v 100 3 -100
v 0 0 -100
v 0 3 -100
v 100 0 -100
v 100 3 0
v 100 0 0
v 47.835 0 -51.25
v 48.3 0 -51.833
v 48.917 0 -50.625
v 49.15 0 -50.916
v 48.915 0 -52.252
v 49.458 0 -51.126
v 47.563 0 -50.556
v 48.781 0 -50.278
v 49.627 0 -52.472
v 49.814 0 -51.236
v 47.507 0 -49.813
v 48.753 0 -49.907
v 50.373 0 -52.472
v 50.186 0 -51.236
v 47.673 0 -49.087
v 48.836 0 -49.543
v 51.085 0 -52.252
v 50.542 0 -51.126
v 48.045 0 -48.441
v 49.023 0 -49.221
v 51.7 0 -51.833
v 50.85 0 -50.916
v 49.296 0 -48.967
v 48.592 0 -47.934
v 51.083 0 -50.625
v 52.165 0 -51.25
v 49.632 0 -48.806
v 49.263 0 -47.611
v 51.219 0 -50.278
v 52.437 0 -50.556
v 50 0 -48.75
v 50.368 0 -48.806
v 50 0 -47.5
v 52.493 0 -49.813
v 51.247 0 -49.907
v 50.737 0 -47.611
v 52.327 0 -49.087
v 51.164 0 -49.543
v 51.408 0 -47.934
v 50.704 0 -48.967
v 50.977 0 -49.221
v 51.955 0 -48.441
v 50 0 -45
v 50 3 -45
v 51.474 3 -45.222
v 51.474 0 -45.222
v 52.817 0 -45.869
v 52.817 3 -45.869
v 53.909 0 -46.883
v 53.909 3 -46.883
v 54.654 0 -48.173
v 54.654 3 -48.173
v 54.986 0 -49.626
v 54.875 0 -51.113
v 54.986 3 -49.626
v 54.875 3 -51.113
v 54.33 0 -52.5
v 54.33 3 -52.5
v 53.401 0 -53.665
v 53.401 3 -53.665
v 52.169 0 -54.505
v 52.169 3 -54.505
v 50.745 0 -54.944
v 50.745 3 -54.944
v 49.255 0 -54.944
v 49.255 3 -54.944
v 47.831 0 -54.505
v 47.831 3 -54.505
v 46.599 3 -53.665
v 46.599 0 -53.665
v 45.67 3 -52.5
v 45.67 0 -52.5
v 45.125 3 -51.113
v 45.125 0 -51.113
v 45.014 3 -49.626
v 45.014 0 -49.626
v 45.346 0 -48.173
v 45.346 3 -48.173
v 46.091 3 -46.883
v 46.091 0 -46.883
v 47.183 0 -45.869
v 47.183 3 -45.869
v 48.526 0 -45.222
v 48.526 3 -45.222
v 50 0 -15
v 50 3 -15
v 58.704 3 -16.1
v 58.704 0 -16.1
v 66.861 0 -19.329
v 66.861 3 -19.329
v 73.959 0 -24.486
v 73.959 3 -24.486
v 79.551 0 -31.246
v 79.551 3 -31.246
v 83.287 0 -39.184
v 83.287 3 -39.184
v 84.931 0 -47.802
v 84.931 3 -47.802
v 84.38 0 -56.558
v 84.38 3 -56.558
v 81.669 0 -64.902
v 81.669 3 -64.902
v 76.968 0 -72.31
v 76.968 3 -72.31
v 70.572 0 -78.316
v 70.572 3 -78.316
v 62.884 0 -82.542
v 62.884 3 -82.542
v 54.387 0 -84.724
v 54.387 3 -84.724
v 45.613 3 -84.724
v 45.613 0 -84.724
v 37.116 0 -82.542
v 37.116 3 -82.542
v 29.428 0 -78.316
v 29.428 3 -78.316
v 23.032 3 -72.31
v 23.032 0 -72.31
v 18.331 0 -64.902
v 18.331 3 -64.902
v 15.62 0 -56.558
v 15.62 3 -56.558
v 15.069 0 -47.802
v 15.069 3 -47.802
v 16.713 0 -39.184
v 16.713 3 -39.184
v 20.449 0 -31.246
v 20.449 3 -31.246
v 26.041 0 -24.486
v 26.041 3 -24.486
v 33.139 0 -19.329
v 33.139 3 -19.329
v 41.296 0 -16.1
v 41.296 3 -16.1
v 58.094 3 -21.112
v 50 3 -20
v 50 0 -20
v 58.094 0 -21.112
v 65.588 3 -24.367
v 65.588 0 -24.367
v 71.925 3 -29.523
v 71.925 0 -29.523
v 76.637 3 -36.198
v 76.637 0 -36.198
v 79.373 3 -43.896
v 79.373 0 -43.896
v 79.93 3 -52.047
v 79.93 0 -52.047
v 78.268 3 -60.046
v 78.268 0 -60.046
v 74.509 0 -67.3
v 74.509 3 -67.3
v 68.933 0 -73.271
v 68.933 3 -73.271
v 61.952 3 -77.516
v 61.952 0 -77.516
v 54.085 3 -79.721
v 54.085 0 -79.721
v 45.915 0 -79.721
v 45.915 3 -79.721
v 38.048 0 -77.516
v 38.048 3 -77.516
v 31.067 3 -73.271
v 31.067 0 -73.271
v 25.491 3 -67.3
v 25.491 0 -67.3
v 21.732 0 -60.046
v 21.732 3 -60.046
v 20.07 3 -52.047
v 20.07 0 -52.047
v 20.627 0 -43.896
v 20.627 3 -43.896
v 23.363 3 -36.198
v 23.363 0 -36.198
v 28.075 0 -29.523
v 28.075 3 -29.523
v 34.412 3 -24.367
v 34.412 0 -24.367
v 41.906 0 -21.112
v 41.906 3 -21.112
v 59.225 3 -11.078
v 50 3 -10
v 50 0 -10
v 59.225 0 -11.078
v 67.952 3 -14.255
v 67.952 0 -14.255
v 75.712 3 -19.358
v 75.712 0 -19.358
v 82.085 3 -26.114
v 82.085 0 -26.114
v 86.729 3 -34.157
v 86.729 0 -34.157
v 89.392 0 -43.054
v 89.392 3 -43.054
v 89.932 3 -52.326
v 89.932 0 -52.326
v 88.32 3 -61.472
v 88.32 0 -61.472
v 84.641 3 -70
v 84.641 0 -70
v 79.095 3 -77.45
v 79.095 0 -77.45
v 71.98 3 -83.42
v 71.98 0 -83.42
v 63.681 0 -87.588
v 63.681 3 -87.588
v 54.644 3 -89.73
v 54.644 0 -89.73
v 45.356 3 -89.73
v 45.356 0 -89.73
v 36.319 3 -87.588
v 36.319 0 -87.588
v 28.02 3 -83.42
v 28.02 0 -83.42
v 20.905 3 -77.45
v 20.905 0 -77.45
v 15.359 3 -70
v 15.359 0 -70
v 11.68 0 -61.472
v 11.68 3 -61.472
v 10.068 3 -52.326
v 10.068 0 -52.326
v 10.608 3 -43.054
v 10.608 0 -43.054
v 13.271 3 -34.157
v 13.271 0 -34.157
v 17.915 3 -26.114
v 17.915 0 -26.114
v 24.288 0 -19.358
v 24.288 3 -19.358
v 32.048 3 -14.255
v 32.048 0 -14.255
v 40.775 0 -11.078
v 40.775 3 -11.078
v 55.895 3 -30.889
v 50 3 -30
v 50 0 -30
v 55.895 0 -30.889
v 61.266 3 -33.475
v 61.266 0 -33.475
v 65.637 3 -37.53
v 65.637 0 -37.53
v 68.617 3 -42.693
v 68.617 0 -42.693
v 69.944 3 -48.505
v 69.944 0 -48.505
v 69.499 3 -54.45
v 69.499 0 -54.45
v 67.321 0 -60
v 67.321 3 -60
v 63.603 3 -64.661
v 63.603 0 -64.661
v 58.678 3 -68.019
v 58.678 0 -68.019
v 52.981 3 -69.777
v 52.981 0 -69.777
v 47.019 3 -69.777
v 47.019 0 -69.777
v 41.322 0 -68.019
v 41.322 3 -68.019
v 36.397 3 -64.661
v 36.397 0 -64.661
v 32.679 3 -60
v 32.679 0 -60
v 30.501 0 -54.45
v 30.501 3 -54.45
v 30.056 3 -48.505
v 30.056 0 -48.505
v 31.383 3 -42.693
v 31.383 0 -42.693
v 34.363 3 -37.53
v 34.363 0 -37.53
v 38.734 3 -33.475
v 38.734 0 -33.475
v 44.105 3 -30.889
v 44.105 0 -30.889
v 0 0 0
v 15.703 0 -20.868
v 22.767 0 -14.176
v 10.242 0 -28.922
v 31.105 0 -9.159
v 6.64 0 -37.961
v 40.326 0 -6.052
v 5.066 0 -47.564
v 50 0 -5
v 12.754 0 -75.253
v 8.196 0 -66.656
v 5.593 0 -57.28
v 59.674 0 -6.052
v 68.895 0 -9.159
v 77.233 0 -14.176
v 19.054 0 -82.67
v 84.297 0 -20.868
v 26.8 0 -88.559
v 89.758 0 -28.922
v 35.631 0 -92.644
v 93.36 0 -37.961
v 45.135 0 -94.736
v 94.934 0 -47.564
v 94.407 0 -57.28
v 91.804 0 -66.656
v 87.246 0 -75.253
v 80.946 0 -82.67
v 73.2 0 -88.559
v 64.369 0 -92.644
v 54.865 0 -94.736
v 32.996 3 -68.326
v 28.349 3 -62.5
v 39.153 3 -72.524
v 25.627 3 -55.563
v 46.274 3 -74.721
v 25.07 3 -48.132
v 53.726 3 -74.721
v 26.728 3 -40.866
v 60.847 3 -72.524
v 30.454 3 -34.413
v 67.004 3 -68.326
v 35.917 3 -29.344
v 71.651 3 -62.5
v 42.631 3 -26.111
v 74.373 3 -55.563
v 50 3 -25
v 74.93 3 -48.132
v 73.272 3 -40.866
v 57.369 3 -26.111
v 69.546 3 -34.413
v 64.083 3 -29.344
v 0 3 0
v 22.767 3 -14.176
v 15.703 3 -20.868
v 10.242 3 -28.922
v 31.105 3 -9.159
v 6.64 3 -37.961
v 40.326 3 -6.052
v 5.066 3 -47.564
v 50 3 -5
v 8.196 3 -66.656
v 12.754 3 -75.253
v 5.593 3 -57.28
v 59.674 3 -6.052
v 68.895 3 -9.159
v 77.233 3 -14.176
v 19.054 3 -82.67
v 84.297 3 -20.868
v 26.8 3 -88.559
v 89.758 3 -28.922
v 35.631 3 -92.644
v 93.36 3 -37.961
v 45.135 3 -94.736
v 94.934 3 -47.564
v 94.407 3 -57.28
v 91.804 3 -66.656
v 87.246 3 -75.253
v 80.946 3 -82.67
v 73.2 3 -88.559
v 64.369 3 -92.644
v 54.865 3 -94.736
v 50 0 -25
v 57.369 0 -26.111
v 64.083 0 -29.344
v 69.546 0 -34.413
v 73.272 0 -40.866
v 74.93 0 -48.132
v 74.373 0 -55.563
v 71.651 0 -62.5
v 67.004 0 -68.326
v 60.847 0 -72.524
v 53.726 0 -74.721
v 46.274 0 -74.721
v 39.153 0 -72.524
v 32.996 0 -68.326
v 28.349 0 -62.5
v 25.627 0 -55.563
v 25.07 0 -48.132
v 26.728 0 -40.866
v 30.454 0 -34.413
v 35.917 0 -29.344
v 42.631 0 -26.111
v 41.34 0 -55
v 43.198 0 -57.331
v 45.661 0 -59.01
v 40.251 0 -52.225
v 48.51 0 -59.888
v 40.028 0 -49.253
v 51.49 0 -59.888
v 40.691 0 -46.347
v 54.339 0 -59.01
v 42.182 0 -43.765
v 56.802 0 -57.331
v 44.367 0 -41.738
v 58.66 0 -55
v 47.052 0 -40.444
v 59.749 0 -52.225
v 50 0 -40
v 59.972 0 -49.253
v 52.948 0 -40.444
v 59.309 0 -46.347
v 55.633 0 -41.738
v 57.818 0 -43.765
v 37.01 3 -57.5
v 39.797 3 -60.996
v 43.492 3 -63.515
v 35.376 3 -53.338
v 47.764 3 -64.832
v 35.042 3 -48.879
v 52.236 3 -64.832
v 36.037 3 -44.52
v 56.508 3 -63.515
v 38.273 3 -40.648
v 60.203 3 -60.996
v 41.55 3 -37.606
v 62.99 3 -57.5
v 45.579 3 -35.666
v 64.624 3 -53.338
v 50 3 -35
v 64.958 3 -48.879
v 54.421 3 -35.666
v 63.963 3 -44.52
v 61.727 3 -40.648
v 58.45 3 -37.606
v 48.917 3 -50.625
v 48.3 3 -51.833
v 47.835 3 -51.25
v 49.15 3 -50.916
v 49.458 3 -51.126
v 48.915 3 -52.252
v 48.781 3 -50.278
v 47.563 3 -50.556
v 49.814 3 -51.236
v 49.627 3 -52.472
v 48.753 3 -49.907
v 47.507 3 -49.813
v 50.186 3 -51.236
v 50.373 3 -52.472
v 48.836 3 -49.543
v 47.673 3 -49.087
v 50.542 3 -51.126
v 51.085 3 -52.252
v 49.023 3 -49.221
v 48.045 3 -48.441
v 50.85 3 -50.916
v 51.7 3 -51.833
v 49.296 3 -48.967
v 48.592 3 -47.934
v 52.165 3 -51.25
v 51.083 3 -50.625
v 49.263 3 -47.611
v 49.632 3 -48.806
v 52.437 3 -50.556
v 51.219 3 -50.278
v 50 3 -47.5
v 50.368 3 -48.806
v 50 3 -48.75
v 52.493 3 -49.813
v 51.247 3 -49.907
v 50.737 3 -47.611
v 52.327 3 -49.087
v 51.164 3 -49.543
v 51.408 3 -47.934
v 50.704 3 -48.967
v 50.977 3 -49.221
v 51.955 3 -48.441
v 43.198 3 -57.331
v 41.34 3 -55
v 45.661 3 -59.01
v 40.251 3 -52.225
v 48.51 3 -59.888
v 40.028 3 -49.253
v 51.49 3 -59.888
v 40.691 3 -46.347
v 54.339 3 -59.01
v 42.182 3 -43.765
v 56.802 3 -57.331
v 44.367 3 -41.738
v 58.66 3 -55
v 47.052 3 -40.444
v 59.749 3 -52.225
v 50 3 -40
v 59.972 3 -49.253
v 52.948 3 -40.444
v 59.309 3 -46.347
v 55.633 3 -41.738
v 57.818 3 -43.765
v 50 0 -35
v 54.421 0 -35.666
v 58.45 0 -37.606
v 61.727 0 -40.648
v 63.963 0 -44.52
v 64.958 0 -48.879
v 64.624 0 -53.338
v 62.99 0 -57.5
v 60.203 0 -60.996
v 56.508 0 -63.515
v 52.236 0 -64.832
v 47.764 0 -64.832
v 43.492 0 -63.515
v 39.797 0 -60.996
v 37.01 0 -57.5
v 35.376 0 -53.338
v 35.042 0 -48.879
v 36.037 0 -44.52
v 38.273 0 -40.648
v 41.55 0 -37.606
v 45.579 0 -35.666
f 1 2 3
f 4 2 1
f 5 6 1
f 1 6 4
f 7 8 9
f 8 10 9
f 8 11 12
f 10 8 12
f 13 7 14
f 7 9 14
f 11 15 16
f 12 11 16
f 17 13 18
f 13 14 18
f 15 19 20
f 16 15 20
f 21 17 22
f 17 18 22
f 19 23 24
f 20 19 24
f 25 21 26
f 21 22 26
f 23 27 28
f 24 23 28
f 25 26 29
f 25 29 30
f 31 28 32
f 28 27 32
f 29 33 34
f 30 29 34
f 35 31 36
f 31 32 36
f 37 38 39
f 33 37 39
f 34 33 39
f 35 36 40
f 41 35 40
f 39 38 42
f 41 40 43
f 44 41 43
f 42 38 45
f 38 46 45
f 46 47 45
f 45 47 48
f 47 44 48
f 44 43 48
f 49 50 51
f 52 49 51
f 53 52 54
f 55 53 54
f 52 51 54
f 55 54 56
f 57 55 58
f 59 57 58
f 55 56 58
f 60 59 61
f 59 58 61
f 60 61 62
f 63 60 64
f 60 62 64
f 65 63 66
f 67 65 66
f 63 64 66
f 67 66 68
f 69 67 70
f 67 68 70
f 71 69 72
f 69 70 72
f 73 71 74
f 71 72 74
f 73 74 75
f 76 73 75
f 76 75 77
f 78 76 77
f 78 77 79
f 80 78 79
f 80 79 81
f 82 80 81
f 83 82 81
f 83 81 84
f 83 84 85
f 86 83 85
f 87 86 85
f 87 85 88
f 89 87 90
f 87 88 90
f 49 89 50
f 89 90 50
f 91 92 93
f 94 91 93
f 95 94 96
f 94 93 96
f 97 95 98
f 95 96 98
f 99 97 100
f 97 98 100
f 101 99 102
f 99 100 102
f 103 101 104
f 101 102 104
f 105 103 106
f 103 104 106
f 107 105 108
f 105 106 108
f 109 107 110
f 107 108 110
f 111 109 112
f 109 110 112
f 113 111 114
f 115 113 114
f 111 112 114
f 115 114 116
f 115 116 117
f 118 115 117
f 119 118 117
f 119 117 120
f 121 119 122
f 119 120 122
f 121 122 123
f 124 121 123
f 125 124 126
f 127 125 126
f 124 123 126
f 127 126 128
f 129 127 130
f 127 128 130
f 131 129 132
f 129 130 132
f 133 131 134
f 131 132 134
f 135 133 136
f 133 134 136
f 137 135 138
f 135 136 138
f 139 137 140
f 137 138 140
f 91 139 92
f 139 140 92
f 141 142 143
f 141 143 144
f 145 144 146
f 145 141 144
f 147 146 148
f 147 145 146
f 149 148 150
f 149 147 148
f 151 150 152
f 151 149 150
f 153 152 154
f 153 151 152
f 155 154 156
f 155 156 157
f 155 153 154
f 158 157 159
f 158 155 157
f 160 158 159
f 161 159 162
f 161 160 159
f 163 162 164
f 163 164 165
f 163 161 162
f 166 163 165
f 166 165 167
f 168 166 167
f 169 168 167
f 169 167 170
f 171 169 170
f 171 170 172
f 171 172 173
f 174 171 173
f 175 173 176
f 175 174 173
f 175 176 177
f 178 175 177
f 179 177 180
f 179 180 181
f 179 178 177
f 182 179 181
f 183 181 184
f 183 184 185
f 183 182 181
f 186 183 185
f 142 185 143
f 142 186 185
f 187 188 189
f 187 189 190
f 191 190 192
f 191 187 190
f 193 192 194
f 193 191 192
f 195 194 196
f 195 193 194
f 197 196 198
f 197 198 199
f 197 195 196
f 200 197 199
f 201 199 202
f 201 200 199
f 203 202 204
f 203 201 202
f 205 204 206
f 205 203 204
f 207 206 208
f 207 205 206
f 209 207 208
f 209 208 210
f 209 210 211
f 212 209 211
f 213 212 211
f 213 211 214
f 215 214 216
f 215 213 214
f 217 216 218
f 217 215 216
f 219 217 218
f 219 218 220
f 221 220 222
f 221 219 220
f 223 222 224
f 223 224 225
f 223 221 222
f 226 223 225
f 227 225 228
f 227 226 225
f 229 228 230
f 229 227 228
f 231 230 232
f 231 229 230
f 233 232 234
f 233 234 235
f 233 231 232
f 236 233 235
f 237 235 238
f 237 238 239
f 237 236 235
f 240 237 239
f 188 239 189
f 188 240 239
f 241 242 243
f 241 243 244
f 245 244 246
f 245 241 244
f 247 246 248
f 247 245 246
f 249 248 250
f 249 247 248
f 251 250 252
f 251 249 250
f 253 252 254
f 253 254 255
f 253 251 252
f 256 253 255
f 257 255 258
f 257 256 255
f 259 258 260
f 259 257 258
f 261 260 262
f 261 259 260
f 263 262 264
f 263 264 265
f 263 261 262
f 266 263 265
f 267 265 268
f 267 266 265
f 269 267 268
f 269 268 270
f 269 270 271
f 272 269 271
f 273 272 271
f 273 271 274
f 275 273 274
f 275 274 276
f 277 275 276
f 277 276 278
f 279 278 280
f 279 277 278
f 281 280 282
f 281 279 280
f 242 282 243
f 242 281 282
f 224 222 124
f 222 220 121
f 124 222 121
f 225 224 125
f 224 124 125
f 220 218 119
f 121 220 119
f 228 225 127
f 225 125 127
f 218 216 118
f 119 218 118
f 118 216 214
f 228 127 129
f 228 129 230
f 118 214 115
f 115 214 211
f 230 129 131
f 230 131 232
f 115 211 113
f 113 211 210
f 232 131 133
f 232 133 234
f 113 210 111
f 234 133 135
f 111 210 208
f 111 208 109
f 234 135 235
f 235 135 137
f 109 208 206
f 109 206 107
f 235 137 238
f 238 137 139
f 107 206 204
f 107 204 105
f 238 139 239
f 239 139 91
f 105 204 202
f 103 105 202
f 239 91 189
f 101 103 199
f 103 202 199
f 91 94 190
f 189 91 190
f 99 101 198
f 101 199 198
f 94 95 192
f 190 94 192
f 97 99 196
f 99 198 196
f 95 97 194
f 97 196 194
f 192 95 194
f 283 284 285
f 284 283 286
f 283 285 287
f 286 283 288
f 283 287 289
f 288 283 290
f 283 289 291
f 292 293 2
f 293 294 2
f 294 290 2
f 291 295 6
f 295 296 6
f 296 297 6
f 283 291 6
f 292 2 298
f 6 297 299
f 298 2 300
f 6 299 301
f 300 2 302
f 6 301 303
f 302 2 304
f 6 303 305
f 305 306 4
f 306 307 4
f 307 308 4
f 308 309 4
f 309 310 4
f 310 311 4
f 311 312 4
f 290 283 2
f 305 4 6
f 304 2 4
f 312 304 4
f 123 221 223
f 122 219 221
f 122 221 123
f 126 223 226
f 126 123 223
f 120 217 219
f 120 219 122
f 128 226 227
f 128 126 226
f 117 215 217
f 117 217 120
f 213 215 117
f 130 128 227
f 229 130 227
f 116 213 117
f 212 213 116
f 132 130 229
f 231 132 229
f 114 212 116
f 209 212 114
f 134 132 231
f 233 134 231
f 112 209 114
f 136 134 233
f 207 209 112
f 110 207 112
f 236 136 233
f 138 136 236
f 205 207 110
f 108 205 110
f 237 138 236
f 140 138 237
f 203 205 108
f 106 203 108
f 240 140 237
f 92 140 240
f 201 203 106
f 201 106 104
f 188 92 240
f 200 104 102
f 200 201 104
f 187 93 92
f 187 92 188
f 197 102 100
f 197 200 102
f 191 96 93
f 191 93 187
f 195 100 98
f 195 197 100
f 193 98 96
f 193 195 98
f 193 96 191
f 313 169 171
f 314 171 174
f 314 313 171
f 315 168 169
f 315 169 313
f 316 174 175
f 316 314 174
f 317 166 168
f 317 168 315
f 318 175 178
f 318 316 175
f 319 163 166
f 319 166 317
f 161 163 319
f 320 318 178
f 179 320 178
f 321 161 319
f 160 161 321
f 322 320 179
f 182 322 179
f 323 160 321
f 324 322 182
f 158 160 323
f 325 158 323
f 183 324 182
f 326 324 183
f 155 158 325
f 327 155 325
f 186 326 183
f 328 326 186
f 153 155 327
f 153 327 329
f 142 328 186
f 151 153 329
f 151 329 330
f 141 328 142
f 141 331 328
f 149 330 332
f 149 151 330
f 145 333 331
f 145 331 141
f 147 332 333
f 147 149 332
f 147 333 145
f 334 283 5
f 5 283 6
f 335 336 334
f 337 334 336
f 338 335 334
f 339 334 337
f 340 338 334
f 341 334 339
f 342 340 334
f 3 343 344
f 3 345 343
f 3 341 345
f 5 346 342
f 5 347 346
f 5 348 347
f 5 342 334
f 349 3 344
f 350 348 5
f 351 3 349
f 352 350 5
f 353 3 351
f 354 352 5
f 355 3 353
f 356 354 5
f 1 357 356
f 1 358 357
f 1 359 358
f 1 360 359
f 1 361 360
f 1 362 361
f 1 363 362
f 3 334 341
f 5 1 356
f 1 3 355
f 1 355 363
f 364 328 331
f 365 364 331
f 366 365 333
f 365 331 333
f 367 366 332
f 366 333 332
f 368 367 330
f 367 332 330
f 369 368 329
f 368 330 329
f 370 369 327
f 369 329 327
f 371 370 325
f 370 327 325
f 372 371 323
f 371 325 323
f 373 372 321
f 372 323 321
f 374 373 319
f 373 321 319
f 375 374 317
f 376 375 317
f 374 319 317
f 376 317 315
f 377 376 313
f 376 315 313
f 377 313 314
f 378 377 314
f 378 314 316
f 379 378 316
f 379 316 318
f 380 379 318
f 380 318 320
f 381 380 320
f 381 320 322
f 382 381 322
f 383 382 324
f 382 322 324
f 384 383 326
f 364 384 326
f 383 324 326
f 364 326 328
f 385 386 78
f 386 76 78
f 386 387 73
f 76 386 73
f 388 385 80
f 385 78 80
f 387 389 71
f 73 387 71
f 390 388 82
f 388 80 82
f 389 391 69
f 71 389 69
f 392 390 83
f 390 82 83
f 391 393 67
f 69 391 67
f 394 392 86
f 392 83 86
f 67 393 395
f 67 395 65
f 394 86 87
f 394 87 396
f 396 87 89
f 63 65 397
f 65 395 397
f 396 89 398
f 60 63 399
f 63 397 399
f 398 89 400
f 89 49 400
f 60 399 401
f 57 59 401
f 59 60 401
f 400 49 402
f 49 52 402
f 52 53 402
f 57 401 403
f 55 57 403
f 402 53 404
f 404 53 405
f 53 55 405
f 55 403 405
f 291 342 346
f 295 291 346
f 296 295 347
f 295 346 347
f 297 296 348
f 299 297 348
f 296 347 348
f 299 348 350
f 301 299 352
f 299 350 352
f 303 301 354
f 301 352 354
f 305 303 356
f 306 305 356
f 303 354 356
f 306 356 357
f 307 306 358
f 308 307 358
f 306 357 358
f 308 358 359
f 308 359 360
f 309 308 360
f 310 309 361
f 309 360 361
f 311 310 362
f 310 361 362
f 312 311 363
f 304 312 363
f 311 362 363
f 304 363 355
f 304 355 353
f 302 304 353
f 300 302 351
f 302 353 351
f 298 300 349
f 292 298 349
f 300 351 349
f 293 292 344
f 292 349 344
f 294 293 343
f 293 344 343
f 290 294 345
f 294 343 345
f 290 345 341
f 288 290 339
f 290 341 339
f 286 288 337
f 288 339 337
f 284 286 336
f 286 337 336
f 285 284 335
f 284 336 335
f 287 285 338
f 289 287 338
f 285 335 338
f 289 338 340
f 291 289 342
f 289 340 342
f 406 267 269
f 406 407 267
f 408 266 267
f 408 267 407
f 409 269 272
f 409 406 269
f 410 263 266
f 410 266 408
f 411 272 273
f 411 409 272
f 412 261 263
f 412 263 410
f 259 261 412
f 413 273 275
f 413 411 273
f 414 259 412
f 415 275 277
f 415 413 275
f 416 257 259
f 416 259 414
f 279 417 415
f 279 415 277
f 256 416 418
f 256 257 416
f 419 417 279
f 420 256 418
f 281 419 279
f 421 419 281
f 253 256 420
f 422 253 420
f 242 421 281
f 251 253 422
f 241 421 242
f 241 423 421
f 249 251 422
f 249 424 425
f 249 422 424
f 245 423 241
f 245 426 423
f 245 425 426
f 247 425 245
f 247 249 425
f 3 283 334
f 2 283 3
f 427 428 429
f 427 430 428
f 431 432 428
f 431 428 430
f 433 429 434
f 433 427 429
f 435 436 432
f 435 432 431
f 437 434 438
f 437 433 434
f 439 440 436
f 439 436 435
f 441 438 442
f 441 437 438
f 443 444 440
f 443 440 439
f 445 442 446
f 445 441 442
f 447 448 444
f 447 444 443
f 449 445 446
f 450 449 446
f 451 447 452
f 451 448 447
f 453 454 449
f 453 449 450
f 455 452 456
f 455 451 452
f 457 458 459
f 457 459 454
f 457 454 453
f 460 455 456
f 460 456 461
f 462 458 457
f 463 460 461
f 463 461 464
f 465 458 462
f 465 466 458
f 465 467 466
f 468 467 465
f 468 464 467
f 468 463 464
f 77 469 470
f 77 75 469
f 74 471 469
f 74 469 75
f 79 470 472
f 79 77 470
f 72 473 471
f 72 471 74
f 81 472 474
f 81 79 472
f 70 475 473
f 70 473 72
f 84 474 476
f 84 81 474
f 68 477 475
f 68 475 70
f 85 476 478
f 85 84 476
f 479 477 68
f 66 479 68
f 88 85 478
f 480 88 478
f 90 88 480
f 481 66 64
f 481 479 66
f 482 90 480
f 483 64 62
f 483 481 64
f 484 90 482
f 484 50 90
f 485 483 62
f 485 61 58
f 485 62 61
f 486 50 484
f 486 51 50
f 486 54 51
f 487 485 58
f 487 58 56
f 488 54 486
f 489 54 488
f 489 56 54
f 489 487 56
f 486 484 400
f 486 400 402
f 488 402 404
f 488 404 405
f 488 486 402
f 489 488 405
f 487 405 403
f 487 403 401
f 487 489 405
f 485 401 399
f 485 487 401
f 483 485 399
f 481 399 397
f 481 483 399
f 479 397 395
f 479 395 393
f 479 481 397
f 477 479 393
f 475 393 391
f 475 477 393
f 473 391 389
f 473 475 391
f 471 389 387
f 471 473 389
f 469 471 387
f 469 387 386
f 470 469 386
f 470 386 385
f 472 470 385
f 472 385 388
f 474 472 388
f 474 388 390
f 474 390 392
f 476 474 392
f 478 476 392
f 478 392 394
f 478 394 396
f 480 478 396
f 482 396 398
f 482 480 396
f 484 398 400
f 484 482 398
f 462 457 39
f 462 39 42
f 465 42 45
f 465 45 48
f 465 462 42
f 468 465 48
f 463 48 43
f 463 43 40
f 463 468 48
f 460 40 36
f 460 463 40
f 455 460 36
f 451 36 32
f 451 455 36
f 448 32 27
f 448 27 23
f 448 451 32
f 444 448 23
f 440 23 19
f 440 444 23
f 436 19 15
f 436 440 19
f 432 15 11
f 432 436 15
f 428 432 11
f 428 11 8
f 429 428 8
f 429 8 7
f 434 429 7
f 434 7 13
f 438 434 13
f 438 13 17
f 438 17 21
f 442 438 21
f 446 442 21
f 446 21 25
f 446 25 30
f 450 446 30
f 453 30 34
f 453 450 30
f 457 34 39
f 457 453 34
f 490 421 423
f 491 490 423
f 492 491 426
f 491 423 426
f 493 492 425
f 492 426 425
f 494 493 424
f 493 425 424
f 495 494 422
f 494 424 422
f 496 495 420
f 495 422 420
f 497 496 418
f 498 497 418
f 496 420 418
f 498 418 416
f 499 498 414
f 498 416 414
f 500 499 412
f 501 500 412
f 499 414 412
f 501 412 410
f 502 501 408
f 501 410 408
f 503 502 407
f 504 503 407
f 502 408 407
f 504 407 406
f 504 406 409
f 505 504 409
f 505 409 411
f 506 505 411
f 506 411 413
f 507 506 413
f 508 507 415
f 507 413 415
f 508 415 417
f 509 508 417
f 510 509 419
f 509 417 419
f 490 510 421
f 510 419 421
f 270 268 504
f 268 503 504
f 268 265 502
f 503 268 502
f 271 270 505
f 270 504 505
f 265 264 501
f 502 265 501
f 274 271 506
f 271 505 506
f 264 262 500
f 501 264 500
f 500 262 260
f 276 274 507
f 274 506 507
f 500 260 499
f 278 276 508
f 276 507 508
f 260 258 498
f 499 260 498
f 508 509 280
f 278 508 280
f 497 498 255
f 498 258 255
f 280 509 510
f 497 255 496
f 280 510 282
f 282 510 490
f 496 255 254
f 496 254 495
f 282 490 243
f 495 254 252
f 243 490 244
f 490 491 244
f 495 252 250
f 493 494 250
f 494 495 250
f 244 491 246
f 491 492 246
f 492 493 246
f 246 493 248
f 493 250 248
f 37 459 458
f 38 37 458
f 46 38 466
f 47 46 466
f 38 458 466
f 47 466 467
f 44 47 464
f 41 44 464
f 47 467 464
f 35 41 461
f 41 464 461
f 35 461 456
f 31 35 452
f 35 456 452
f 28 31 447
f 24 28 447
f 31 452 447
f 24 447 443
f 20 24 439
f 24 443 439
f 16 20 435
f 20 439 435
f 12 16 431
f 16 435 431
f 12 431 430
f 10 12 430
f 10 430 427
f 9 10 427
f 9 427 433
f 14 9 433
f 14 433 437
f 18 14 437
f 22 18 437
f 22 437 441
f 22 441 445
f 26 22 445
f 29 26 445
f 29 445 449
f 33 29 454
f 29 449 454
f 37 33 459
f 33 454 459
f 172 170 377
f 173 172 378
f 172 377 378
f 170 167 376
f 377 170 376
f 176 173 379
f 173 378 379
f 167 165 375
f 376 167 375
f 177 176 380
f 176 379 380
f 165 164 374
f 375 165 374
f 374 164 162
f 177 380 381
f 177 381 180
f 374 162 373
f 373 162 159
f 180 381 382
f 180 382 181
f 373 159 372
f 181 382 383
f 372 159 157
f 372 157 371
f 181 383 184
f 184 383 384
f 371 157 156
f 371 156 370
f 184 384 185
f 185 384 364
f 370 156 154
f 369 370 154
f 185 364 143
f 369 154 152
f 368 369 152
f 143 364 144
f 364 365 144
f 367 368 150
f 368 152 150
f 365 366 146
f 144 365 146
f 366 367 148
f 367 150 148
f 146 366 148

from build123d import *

# Parameters (mm, degrees)
SKETCH1_W           = 100
SKETCH1_H           = 100
BOSS_EXTRUDE1_DEPTH = 3
SKETCH2_R           = 45
CUT_EXTRUDE1_DEPTH  = 3
SKETCH3_R           = 40
BOSS_EXTRUDE2_DEPTH = 3
SKETCH4_R           = 35
CUT_EXTRUDE2_DEPTH  = 3
SKETCH5_R           = 30
BOSS_EXTRUDE3_DEPTH = 3
SKETCH6_R           = 25
CUT_EXTRUDE3_DEPTH  = 3
SKETCH7_R           = 20
BOSS_EXTRUDE4_DEPTH = 3
SKETCH8_R           = 15
CUT_EXTRUDE4_DEPTH  = 3
SKETCH9_R           = 10
BOSS_EXTRUDE5_DEPTH = 3
SKETCH10_R          = 5
CUT_EXTRUDE5_DEPTH  = 3
SKETCH11_R          = 2.5
BOSS_EXTRUDE6_DEPTH = 3
SKETCH12_R          = 1.25
CUT_EXTRUDE6_DEPTH  = 3


with BuildPart() as part:
    # Sketch1 → Boss-Extrude1 (new body)
    with BuildSketch(Plane(origin=(0, 0, 0), x_dir=(1, 0, 0), z_dir=(0, 1, 0))):
        with Locations((50, 50)):
            Rectangle(SKETCH1_W, SKETCH1_H)
    extrude(amount=BOSS_EXTRUDE1_DEPTH)

    # Sketch2 → Cut-Extrude1 (cut)
    with BuildSketch(Plane(origin=(0, 3, 0), x_dir=(1, 0, 0), z_dir=(0, 1, 0))):
        with Locations(Location((50, 50, 0), (0, 0, 270))):
            Circle(SKETCH2_R)
    extrude(amount=-CUT_EXTRUDE1_DEPTH, mode=Mode.SUBTRACT)


with BuildPart() as body_2:
    # Sketch3 → Boss-Extrude2 (new body)
    with BuildSketch(Plane(origin=(0, 3, 0), x_dir=(1, 0, 0), z_dir=(0, 1, 0))):
        with Locations(Location((50, 50, 0), (0, 0, 270))):
            Circle(SKETCH3_R)
    extrude(amount=-BOSS_EXTRUDE2_DEPTH)

    # Sketch4 → Cut-Extrude2 (cut)
    with BuildSketch(Plane(origin=(0, 3, 0), x_dir=(1, 0, 0), z_dir=(0, 1, 0))):
        with Locations(Location((50, 50, 0), (0, 0, 270))):
            Circle(SKETCH4_R)
    extrude(amount=-CUT_EXTRUDE2_DEPTH, mode=Mode.SUBTRACT)


with BuildPart() as body_3:
    # Sketch5 → Boss-Extrude3 (new body)
    with BuildSketch(Plane(origin=(0, 3, 0), x_dir=(1, 0, 0), z_dir=(0, 1, 0))):
        with Locations(Location((50, 50, 0), (0, 0, 270))):
            Circle(SKETCH5_R)
    extrude(amount=-BOSS_EXTRUDE3_DEPTH)

    # Sketch6 → Cut-Extrude3 (cut)
    with BuildSketch(Plane(origin=(0, 3, 0), x_dir=(1, 0, 0), z_dir=(0, 1, 0))):
        with Locations(Location((50, 50, 0), (0, 0, 270))):
            Circle(SKETCH6_R)
    extrude(amount=-CUT_EXTRUDE3_DEPTH, mode=Mode.SUBTRACT)


with BuildPart() as body_4:
    # Sketch7 → Boss-Extrude4 (new body)
    with BuildSketch(Plane(origin=(0, 3, 0), x_dir=(1, 0, 0), z_dir=(0, 1, 0))):
        with Locations(Location((50, 50, 0), (0, 0, 270))):
            Circle(SKETCH7_R)
    extrude(amount=-BOSS_EXTRUDE4_DEPTH)

    # Sketch8 → Cut-Extrude4 (cut)
    with BuildSketch(Plane(origin=(0, 3, 0), x_dir=(1, 0, 0), z_dir=(0, 1, 0))):
        with Locations(Location((50, 50, 0), (0, 0, 270))):
            Circle(SKETCH8_R)
    extrude(amount=-CUT_EXTRUDE4_DEPTH, mode=Mode.SUBTRACT)


with BuildPart() as body_5:
    # Sketch9 → Boss-Extrude5 (new body)
    with BuildSketch(Plane(origin=(0, 3, 0), x_dir=(1, 0, 0), z_dir=(0, 1, 0))):
        with Locations(Location((50, 50, 0), (0, 0, 270))):
            Circle(SKETCH9_R)
    extrude(amount=-BOSS_EXTRUDE5_DEPTH)

    # Sketch10 → Cut-Extrude5 (cut)
    with BuildSketch(Plane(origin=(0, 3, 0), x_dir=(1, 0, 0), z_dir=(0, 1, 0))):
        with Locations(Location((50, 50, 0), (0, 0, 270))):
            Circle(SKETCH10_R)
    extrude(amount=-CUT_EXTRUDE5_DEPTH, mode=Mode.SUBTRACT)


with BuildPart() as body_6:
    # Sketch11 → Boss-Extrude6 (new body)
    with BuildSketch(Plane(origin=(0, 3, 0), x_dir=(1, 0, 0), z_dir=(0, 1, 0))):
        with Locations(Location((50, 50, 0), (0, 0, 270))):
            Circle(SKETCH11_R)
    extrude(amount=-BOSS_EXTRUDE6_DEPTH)

    # Sketch12 → Cut-Extrude6 (cut)
    with BuildSketch(Plane(origin=(0, 3, 0), x_dir=(1, 0, 0), z_dir=(0, 1, 0))):
        with Locations(Location((50, 50, 0), (0, 0, 270))):
            Circle(SKETCH12_R)
    extrude(amount=-CUT_EXTRUDE6_DEPTH, mode=Mode.SUBTRACT)


solid = Compound([part.part, body_2.part, body_3.part, body_4.part, body_5.part, body_6.part])
